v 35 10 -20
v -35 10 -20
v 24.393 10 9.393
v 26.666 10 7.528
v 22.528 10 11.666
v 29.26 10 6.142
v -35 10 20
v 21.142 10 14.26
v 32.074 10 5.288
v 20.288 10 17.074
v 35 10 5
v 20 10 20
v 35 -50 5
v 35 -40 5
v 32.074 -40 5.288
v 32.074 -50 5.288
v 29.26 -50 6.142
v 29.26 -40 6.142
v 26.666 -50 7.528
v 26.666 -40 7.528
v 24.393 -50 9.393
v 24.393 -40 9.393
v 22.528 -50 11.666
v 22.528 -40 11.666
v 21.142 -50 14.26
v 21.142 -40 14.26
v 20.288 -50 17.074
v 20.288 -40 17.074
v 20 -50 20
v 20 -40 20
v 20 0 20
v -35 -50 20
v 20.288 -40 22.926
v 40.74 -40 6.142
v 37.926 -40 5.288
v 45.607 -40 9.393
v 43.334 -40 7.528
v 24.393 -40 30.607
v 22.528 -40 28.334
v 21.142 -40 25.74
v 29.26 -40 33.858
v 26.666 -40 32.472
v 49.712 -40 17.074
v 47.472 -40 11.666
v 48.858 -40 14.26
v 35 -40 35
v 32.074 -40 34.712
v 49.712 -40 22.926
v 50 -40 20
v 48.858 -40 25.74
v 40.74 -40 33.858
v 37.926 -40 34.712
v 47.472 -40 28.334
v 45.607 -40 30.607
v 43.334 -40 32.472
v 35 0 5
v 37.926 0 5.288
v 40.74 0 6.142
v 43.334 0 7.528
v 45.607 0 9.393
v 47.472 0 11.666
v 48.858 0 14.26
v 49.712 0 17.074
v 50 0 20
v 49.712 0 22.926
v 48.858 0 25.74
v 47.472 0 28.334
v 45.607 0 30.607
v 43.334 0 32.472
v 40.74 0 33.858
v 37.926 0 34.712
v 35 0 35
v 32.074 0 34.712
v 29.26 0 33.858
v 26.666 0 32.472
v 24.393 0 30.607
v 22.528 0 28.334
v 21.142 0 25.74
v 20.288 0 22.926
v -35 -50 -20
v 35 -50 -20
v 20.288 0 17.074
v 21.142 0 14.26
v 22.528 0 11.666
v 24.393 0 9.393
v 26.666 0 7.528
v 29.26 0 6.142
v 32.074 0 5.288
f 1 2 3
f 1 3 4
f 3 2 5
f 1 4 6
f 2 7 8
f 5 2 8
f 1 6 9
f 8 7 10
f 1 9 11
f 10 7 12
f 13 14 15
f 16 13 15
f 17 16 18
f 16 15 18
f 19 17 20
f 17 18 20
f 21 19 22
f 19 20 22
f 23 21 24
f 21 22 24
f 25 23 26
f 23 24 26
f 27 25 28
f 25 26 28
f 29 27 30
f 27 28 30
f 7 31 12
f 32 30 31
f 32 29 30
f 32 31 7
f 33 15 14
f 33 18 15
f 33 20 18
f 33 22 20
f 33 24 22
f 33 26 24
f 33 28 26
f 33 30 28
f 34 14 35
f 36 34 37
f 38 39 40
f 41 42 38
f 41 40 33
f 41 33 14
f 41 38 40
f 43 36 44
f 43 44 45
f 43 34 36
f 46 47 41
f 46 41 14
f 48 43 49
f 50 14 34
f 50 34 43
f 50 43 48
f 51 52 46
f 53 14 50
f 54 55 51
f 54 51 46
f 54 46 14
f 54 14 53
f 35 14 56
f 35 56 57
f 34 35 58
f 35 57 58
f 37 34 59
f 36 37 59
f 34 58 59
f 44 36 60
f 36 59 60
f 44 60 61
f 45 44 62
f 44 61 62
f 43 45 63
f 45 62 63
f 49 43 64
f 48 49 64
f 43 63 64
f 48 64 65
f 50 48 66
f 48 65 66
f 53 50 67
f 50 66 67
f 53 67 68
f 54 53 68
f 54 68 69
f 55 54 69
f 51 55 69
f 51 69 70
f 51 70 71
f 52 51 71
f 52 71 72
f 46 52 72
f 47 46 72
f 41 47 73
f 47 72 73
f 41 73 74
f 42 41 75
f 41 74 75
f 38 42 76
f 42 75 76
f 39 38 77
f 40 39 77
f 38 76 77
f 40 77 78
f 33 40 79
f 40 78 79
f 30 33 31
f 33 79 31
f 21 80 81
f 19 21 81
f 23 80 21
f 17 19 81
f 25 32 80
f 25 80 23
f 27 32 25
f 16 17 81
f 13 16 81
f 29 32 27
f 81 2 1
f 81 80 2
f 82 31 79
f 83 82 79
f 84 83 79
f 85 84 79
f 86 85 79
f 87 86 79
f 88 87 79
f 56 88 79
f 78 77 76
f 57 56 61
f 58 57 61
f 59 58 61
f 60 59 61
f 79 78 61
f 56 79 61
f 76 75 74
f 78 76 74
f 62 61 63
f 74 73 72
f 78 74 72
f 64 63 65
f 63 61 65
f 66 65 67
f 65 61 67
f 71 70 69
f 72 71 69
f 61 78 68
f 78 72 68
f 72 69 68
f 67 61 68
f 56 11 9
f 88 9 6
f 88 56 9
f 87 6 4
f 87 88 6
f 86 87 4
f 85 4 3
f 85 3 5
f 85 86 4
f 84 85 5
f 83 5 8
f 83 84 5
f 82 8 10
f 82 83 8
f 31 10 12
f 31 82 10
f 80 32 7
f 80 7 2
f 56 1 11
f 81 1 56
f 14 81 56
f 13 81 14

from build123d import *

# Parameters (mm, degrees)
F1_DEPTH = 10
F2_DEPTH = 40


with BuildPart() as f1:
    # F0 (on Front) → F1 (new body, symmetric)
    with BuildSketch(Plane.XZ):
        with BuildLine():
            ThreePointArc((35, 5), (24.3933982822, 9.3933982822), (20, 20))
            Line((20, 20), (-35, 20))
            Line((-35, 20), (-35, -20))
            Line((-35, -20), (35, -20))
            Line((35, -20), (35, 5))
        make_face()
    extrude(amount=F1_DEPTH, both=True)

    # F0 (on Front) + F1_face (on face) → F2 (join)
    with BuildSketch(Plane.XZ):
        with BuildLine():
            Line((35, 5), (35, 20))
            Line((35, 20), (20, 20))
            ThreePointArc((20, 20), (24.3933982822, 9.3933982822), (35, 5))
        make_face()
        with BuildLine():
            Line((20, 20), (35, 20))
            Line((35, 20), (35, 5))
            ThreePointArc((35, 5), (45.6066017178, 9.3933982822), (50, 20))
            ThreePointArc((50, 20), (35, 35), (20, 20))
        make_face()
        with BuildLine():
            ThreePointArc((35, 5), (24.3933982822, 9.3933982822), (20, 20))
            Line((20, 20), (-35, 20))
            Line((-35, 20), (-35, -20))
            Line((-35, -20), (35, -20))
            Line((35, -20), (35, 5))
        make_face()
    with BuildSketch(Plane(origin=(-1.9288829615, -10, -0.9184253163), x_dir=(1, 0, 0), z_dir=(0, -1, 0))):
        with BuildLine():
            ThreePointArc((36.9288829615, 5.9184253163), (26.3222812437, 10.3118235985), (21.9288829615, 20.9184253163))
            Line((21.9288829615, 20.9184253163), (-33.0711170385, 20.9184253163))
            Line((-33.0711170385, 20.9184253163), (-33.0711170385, -19.0815746837))
            Line((-33.0711170385, -19.0815746837), (36.9288829615, -19.0815746837))
            Line((36.9288829615, -19.0815746837), (36.9288829615, 5.9184253163))
        make_face()
    extrude(amount=F2_DEPTH)


solid = f1.part
